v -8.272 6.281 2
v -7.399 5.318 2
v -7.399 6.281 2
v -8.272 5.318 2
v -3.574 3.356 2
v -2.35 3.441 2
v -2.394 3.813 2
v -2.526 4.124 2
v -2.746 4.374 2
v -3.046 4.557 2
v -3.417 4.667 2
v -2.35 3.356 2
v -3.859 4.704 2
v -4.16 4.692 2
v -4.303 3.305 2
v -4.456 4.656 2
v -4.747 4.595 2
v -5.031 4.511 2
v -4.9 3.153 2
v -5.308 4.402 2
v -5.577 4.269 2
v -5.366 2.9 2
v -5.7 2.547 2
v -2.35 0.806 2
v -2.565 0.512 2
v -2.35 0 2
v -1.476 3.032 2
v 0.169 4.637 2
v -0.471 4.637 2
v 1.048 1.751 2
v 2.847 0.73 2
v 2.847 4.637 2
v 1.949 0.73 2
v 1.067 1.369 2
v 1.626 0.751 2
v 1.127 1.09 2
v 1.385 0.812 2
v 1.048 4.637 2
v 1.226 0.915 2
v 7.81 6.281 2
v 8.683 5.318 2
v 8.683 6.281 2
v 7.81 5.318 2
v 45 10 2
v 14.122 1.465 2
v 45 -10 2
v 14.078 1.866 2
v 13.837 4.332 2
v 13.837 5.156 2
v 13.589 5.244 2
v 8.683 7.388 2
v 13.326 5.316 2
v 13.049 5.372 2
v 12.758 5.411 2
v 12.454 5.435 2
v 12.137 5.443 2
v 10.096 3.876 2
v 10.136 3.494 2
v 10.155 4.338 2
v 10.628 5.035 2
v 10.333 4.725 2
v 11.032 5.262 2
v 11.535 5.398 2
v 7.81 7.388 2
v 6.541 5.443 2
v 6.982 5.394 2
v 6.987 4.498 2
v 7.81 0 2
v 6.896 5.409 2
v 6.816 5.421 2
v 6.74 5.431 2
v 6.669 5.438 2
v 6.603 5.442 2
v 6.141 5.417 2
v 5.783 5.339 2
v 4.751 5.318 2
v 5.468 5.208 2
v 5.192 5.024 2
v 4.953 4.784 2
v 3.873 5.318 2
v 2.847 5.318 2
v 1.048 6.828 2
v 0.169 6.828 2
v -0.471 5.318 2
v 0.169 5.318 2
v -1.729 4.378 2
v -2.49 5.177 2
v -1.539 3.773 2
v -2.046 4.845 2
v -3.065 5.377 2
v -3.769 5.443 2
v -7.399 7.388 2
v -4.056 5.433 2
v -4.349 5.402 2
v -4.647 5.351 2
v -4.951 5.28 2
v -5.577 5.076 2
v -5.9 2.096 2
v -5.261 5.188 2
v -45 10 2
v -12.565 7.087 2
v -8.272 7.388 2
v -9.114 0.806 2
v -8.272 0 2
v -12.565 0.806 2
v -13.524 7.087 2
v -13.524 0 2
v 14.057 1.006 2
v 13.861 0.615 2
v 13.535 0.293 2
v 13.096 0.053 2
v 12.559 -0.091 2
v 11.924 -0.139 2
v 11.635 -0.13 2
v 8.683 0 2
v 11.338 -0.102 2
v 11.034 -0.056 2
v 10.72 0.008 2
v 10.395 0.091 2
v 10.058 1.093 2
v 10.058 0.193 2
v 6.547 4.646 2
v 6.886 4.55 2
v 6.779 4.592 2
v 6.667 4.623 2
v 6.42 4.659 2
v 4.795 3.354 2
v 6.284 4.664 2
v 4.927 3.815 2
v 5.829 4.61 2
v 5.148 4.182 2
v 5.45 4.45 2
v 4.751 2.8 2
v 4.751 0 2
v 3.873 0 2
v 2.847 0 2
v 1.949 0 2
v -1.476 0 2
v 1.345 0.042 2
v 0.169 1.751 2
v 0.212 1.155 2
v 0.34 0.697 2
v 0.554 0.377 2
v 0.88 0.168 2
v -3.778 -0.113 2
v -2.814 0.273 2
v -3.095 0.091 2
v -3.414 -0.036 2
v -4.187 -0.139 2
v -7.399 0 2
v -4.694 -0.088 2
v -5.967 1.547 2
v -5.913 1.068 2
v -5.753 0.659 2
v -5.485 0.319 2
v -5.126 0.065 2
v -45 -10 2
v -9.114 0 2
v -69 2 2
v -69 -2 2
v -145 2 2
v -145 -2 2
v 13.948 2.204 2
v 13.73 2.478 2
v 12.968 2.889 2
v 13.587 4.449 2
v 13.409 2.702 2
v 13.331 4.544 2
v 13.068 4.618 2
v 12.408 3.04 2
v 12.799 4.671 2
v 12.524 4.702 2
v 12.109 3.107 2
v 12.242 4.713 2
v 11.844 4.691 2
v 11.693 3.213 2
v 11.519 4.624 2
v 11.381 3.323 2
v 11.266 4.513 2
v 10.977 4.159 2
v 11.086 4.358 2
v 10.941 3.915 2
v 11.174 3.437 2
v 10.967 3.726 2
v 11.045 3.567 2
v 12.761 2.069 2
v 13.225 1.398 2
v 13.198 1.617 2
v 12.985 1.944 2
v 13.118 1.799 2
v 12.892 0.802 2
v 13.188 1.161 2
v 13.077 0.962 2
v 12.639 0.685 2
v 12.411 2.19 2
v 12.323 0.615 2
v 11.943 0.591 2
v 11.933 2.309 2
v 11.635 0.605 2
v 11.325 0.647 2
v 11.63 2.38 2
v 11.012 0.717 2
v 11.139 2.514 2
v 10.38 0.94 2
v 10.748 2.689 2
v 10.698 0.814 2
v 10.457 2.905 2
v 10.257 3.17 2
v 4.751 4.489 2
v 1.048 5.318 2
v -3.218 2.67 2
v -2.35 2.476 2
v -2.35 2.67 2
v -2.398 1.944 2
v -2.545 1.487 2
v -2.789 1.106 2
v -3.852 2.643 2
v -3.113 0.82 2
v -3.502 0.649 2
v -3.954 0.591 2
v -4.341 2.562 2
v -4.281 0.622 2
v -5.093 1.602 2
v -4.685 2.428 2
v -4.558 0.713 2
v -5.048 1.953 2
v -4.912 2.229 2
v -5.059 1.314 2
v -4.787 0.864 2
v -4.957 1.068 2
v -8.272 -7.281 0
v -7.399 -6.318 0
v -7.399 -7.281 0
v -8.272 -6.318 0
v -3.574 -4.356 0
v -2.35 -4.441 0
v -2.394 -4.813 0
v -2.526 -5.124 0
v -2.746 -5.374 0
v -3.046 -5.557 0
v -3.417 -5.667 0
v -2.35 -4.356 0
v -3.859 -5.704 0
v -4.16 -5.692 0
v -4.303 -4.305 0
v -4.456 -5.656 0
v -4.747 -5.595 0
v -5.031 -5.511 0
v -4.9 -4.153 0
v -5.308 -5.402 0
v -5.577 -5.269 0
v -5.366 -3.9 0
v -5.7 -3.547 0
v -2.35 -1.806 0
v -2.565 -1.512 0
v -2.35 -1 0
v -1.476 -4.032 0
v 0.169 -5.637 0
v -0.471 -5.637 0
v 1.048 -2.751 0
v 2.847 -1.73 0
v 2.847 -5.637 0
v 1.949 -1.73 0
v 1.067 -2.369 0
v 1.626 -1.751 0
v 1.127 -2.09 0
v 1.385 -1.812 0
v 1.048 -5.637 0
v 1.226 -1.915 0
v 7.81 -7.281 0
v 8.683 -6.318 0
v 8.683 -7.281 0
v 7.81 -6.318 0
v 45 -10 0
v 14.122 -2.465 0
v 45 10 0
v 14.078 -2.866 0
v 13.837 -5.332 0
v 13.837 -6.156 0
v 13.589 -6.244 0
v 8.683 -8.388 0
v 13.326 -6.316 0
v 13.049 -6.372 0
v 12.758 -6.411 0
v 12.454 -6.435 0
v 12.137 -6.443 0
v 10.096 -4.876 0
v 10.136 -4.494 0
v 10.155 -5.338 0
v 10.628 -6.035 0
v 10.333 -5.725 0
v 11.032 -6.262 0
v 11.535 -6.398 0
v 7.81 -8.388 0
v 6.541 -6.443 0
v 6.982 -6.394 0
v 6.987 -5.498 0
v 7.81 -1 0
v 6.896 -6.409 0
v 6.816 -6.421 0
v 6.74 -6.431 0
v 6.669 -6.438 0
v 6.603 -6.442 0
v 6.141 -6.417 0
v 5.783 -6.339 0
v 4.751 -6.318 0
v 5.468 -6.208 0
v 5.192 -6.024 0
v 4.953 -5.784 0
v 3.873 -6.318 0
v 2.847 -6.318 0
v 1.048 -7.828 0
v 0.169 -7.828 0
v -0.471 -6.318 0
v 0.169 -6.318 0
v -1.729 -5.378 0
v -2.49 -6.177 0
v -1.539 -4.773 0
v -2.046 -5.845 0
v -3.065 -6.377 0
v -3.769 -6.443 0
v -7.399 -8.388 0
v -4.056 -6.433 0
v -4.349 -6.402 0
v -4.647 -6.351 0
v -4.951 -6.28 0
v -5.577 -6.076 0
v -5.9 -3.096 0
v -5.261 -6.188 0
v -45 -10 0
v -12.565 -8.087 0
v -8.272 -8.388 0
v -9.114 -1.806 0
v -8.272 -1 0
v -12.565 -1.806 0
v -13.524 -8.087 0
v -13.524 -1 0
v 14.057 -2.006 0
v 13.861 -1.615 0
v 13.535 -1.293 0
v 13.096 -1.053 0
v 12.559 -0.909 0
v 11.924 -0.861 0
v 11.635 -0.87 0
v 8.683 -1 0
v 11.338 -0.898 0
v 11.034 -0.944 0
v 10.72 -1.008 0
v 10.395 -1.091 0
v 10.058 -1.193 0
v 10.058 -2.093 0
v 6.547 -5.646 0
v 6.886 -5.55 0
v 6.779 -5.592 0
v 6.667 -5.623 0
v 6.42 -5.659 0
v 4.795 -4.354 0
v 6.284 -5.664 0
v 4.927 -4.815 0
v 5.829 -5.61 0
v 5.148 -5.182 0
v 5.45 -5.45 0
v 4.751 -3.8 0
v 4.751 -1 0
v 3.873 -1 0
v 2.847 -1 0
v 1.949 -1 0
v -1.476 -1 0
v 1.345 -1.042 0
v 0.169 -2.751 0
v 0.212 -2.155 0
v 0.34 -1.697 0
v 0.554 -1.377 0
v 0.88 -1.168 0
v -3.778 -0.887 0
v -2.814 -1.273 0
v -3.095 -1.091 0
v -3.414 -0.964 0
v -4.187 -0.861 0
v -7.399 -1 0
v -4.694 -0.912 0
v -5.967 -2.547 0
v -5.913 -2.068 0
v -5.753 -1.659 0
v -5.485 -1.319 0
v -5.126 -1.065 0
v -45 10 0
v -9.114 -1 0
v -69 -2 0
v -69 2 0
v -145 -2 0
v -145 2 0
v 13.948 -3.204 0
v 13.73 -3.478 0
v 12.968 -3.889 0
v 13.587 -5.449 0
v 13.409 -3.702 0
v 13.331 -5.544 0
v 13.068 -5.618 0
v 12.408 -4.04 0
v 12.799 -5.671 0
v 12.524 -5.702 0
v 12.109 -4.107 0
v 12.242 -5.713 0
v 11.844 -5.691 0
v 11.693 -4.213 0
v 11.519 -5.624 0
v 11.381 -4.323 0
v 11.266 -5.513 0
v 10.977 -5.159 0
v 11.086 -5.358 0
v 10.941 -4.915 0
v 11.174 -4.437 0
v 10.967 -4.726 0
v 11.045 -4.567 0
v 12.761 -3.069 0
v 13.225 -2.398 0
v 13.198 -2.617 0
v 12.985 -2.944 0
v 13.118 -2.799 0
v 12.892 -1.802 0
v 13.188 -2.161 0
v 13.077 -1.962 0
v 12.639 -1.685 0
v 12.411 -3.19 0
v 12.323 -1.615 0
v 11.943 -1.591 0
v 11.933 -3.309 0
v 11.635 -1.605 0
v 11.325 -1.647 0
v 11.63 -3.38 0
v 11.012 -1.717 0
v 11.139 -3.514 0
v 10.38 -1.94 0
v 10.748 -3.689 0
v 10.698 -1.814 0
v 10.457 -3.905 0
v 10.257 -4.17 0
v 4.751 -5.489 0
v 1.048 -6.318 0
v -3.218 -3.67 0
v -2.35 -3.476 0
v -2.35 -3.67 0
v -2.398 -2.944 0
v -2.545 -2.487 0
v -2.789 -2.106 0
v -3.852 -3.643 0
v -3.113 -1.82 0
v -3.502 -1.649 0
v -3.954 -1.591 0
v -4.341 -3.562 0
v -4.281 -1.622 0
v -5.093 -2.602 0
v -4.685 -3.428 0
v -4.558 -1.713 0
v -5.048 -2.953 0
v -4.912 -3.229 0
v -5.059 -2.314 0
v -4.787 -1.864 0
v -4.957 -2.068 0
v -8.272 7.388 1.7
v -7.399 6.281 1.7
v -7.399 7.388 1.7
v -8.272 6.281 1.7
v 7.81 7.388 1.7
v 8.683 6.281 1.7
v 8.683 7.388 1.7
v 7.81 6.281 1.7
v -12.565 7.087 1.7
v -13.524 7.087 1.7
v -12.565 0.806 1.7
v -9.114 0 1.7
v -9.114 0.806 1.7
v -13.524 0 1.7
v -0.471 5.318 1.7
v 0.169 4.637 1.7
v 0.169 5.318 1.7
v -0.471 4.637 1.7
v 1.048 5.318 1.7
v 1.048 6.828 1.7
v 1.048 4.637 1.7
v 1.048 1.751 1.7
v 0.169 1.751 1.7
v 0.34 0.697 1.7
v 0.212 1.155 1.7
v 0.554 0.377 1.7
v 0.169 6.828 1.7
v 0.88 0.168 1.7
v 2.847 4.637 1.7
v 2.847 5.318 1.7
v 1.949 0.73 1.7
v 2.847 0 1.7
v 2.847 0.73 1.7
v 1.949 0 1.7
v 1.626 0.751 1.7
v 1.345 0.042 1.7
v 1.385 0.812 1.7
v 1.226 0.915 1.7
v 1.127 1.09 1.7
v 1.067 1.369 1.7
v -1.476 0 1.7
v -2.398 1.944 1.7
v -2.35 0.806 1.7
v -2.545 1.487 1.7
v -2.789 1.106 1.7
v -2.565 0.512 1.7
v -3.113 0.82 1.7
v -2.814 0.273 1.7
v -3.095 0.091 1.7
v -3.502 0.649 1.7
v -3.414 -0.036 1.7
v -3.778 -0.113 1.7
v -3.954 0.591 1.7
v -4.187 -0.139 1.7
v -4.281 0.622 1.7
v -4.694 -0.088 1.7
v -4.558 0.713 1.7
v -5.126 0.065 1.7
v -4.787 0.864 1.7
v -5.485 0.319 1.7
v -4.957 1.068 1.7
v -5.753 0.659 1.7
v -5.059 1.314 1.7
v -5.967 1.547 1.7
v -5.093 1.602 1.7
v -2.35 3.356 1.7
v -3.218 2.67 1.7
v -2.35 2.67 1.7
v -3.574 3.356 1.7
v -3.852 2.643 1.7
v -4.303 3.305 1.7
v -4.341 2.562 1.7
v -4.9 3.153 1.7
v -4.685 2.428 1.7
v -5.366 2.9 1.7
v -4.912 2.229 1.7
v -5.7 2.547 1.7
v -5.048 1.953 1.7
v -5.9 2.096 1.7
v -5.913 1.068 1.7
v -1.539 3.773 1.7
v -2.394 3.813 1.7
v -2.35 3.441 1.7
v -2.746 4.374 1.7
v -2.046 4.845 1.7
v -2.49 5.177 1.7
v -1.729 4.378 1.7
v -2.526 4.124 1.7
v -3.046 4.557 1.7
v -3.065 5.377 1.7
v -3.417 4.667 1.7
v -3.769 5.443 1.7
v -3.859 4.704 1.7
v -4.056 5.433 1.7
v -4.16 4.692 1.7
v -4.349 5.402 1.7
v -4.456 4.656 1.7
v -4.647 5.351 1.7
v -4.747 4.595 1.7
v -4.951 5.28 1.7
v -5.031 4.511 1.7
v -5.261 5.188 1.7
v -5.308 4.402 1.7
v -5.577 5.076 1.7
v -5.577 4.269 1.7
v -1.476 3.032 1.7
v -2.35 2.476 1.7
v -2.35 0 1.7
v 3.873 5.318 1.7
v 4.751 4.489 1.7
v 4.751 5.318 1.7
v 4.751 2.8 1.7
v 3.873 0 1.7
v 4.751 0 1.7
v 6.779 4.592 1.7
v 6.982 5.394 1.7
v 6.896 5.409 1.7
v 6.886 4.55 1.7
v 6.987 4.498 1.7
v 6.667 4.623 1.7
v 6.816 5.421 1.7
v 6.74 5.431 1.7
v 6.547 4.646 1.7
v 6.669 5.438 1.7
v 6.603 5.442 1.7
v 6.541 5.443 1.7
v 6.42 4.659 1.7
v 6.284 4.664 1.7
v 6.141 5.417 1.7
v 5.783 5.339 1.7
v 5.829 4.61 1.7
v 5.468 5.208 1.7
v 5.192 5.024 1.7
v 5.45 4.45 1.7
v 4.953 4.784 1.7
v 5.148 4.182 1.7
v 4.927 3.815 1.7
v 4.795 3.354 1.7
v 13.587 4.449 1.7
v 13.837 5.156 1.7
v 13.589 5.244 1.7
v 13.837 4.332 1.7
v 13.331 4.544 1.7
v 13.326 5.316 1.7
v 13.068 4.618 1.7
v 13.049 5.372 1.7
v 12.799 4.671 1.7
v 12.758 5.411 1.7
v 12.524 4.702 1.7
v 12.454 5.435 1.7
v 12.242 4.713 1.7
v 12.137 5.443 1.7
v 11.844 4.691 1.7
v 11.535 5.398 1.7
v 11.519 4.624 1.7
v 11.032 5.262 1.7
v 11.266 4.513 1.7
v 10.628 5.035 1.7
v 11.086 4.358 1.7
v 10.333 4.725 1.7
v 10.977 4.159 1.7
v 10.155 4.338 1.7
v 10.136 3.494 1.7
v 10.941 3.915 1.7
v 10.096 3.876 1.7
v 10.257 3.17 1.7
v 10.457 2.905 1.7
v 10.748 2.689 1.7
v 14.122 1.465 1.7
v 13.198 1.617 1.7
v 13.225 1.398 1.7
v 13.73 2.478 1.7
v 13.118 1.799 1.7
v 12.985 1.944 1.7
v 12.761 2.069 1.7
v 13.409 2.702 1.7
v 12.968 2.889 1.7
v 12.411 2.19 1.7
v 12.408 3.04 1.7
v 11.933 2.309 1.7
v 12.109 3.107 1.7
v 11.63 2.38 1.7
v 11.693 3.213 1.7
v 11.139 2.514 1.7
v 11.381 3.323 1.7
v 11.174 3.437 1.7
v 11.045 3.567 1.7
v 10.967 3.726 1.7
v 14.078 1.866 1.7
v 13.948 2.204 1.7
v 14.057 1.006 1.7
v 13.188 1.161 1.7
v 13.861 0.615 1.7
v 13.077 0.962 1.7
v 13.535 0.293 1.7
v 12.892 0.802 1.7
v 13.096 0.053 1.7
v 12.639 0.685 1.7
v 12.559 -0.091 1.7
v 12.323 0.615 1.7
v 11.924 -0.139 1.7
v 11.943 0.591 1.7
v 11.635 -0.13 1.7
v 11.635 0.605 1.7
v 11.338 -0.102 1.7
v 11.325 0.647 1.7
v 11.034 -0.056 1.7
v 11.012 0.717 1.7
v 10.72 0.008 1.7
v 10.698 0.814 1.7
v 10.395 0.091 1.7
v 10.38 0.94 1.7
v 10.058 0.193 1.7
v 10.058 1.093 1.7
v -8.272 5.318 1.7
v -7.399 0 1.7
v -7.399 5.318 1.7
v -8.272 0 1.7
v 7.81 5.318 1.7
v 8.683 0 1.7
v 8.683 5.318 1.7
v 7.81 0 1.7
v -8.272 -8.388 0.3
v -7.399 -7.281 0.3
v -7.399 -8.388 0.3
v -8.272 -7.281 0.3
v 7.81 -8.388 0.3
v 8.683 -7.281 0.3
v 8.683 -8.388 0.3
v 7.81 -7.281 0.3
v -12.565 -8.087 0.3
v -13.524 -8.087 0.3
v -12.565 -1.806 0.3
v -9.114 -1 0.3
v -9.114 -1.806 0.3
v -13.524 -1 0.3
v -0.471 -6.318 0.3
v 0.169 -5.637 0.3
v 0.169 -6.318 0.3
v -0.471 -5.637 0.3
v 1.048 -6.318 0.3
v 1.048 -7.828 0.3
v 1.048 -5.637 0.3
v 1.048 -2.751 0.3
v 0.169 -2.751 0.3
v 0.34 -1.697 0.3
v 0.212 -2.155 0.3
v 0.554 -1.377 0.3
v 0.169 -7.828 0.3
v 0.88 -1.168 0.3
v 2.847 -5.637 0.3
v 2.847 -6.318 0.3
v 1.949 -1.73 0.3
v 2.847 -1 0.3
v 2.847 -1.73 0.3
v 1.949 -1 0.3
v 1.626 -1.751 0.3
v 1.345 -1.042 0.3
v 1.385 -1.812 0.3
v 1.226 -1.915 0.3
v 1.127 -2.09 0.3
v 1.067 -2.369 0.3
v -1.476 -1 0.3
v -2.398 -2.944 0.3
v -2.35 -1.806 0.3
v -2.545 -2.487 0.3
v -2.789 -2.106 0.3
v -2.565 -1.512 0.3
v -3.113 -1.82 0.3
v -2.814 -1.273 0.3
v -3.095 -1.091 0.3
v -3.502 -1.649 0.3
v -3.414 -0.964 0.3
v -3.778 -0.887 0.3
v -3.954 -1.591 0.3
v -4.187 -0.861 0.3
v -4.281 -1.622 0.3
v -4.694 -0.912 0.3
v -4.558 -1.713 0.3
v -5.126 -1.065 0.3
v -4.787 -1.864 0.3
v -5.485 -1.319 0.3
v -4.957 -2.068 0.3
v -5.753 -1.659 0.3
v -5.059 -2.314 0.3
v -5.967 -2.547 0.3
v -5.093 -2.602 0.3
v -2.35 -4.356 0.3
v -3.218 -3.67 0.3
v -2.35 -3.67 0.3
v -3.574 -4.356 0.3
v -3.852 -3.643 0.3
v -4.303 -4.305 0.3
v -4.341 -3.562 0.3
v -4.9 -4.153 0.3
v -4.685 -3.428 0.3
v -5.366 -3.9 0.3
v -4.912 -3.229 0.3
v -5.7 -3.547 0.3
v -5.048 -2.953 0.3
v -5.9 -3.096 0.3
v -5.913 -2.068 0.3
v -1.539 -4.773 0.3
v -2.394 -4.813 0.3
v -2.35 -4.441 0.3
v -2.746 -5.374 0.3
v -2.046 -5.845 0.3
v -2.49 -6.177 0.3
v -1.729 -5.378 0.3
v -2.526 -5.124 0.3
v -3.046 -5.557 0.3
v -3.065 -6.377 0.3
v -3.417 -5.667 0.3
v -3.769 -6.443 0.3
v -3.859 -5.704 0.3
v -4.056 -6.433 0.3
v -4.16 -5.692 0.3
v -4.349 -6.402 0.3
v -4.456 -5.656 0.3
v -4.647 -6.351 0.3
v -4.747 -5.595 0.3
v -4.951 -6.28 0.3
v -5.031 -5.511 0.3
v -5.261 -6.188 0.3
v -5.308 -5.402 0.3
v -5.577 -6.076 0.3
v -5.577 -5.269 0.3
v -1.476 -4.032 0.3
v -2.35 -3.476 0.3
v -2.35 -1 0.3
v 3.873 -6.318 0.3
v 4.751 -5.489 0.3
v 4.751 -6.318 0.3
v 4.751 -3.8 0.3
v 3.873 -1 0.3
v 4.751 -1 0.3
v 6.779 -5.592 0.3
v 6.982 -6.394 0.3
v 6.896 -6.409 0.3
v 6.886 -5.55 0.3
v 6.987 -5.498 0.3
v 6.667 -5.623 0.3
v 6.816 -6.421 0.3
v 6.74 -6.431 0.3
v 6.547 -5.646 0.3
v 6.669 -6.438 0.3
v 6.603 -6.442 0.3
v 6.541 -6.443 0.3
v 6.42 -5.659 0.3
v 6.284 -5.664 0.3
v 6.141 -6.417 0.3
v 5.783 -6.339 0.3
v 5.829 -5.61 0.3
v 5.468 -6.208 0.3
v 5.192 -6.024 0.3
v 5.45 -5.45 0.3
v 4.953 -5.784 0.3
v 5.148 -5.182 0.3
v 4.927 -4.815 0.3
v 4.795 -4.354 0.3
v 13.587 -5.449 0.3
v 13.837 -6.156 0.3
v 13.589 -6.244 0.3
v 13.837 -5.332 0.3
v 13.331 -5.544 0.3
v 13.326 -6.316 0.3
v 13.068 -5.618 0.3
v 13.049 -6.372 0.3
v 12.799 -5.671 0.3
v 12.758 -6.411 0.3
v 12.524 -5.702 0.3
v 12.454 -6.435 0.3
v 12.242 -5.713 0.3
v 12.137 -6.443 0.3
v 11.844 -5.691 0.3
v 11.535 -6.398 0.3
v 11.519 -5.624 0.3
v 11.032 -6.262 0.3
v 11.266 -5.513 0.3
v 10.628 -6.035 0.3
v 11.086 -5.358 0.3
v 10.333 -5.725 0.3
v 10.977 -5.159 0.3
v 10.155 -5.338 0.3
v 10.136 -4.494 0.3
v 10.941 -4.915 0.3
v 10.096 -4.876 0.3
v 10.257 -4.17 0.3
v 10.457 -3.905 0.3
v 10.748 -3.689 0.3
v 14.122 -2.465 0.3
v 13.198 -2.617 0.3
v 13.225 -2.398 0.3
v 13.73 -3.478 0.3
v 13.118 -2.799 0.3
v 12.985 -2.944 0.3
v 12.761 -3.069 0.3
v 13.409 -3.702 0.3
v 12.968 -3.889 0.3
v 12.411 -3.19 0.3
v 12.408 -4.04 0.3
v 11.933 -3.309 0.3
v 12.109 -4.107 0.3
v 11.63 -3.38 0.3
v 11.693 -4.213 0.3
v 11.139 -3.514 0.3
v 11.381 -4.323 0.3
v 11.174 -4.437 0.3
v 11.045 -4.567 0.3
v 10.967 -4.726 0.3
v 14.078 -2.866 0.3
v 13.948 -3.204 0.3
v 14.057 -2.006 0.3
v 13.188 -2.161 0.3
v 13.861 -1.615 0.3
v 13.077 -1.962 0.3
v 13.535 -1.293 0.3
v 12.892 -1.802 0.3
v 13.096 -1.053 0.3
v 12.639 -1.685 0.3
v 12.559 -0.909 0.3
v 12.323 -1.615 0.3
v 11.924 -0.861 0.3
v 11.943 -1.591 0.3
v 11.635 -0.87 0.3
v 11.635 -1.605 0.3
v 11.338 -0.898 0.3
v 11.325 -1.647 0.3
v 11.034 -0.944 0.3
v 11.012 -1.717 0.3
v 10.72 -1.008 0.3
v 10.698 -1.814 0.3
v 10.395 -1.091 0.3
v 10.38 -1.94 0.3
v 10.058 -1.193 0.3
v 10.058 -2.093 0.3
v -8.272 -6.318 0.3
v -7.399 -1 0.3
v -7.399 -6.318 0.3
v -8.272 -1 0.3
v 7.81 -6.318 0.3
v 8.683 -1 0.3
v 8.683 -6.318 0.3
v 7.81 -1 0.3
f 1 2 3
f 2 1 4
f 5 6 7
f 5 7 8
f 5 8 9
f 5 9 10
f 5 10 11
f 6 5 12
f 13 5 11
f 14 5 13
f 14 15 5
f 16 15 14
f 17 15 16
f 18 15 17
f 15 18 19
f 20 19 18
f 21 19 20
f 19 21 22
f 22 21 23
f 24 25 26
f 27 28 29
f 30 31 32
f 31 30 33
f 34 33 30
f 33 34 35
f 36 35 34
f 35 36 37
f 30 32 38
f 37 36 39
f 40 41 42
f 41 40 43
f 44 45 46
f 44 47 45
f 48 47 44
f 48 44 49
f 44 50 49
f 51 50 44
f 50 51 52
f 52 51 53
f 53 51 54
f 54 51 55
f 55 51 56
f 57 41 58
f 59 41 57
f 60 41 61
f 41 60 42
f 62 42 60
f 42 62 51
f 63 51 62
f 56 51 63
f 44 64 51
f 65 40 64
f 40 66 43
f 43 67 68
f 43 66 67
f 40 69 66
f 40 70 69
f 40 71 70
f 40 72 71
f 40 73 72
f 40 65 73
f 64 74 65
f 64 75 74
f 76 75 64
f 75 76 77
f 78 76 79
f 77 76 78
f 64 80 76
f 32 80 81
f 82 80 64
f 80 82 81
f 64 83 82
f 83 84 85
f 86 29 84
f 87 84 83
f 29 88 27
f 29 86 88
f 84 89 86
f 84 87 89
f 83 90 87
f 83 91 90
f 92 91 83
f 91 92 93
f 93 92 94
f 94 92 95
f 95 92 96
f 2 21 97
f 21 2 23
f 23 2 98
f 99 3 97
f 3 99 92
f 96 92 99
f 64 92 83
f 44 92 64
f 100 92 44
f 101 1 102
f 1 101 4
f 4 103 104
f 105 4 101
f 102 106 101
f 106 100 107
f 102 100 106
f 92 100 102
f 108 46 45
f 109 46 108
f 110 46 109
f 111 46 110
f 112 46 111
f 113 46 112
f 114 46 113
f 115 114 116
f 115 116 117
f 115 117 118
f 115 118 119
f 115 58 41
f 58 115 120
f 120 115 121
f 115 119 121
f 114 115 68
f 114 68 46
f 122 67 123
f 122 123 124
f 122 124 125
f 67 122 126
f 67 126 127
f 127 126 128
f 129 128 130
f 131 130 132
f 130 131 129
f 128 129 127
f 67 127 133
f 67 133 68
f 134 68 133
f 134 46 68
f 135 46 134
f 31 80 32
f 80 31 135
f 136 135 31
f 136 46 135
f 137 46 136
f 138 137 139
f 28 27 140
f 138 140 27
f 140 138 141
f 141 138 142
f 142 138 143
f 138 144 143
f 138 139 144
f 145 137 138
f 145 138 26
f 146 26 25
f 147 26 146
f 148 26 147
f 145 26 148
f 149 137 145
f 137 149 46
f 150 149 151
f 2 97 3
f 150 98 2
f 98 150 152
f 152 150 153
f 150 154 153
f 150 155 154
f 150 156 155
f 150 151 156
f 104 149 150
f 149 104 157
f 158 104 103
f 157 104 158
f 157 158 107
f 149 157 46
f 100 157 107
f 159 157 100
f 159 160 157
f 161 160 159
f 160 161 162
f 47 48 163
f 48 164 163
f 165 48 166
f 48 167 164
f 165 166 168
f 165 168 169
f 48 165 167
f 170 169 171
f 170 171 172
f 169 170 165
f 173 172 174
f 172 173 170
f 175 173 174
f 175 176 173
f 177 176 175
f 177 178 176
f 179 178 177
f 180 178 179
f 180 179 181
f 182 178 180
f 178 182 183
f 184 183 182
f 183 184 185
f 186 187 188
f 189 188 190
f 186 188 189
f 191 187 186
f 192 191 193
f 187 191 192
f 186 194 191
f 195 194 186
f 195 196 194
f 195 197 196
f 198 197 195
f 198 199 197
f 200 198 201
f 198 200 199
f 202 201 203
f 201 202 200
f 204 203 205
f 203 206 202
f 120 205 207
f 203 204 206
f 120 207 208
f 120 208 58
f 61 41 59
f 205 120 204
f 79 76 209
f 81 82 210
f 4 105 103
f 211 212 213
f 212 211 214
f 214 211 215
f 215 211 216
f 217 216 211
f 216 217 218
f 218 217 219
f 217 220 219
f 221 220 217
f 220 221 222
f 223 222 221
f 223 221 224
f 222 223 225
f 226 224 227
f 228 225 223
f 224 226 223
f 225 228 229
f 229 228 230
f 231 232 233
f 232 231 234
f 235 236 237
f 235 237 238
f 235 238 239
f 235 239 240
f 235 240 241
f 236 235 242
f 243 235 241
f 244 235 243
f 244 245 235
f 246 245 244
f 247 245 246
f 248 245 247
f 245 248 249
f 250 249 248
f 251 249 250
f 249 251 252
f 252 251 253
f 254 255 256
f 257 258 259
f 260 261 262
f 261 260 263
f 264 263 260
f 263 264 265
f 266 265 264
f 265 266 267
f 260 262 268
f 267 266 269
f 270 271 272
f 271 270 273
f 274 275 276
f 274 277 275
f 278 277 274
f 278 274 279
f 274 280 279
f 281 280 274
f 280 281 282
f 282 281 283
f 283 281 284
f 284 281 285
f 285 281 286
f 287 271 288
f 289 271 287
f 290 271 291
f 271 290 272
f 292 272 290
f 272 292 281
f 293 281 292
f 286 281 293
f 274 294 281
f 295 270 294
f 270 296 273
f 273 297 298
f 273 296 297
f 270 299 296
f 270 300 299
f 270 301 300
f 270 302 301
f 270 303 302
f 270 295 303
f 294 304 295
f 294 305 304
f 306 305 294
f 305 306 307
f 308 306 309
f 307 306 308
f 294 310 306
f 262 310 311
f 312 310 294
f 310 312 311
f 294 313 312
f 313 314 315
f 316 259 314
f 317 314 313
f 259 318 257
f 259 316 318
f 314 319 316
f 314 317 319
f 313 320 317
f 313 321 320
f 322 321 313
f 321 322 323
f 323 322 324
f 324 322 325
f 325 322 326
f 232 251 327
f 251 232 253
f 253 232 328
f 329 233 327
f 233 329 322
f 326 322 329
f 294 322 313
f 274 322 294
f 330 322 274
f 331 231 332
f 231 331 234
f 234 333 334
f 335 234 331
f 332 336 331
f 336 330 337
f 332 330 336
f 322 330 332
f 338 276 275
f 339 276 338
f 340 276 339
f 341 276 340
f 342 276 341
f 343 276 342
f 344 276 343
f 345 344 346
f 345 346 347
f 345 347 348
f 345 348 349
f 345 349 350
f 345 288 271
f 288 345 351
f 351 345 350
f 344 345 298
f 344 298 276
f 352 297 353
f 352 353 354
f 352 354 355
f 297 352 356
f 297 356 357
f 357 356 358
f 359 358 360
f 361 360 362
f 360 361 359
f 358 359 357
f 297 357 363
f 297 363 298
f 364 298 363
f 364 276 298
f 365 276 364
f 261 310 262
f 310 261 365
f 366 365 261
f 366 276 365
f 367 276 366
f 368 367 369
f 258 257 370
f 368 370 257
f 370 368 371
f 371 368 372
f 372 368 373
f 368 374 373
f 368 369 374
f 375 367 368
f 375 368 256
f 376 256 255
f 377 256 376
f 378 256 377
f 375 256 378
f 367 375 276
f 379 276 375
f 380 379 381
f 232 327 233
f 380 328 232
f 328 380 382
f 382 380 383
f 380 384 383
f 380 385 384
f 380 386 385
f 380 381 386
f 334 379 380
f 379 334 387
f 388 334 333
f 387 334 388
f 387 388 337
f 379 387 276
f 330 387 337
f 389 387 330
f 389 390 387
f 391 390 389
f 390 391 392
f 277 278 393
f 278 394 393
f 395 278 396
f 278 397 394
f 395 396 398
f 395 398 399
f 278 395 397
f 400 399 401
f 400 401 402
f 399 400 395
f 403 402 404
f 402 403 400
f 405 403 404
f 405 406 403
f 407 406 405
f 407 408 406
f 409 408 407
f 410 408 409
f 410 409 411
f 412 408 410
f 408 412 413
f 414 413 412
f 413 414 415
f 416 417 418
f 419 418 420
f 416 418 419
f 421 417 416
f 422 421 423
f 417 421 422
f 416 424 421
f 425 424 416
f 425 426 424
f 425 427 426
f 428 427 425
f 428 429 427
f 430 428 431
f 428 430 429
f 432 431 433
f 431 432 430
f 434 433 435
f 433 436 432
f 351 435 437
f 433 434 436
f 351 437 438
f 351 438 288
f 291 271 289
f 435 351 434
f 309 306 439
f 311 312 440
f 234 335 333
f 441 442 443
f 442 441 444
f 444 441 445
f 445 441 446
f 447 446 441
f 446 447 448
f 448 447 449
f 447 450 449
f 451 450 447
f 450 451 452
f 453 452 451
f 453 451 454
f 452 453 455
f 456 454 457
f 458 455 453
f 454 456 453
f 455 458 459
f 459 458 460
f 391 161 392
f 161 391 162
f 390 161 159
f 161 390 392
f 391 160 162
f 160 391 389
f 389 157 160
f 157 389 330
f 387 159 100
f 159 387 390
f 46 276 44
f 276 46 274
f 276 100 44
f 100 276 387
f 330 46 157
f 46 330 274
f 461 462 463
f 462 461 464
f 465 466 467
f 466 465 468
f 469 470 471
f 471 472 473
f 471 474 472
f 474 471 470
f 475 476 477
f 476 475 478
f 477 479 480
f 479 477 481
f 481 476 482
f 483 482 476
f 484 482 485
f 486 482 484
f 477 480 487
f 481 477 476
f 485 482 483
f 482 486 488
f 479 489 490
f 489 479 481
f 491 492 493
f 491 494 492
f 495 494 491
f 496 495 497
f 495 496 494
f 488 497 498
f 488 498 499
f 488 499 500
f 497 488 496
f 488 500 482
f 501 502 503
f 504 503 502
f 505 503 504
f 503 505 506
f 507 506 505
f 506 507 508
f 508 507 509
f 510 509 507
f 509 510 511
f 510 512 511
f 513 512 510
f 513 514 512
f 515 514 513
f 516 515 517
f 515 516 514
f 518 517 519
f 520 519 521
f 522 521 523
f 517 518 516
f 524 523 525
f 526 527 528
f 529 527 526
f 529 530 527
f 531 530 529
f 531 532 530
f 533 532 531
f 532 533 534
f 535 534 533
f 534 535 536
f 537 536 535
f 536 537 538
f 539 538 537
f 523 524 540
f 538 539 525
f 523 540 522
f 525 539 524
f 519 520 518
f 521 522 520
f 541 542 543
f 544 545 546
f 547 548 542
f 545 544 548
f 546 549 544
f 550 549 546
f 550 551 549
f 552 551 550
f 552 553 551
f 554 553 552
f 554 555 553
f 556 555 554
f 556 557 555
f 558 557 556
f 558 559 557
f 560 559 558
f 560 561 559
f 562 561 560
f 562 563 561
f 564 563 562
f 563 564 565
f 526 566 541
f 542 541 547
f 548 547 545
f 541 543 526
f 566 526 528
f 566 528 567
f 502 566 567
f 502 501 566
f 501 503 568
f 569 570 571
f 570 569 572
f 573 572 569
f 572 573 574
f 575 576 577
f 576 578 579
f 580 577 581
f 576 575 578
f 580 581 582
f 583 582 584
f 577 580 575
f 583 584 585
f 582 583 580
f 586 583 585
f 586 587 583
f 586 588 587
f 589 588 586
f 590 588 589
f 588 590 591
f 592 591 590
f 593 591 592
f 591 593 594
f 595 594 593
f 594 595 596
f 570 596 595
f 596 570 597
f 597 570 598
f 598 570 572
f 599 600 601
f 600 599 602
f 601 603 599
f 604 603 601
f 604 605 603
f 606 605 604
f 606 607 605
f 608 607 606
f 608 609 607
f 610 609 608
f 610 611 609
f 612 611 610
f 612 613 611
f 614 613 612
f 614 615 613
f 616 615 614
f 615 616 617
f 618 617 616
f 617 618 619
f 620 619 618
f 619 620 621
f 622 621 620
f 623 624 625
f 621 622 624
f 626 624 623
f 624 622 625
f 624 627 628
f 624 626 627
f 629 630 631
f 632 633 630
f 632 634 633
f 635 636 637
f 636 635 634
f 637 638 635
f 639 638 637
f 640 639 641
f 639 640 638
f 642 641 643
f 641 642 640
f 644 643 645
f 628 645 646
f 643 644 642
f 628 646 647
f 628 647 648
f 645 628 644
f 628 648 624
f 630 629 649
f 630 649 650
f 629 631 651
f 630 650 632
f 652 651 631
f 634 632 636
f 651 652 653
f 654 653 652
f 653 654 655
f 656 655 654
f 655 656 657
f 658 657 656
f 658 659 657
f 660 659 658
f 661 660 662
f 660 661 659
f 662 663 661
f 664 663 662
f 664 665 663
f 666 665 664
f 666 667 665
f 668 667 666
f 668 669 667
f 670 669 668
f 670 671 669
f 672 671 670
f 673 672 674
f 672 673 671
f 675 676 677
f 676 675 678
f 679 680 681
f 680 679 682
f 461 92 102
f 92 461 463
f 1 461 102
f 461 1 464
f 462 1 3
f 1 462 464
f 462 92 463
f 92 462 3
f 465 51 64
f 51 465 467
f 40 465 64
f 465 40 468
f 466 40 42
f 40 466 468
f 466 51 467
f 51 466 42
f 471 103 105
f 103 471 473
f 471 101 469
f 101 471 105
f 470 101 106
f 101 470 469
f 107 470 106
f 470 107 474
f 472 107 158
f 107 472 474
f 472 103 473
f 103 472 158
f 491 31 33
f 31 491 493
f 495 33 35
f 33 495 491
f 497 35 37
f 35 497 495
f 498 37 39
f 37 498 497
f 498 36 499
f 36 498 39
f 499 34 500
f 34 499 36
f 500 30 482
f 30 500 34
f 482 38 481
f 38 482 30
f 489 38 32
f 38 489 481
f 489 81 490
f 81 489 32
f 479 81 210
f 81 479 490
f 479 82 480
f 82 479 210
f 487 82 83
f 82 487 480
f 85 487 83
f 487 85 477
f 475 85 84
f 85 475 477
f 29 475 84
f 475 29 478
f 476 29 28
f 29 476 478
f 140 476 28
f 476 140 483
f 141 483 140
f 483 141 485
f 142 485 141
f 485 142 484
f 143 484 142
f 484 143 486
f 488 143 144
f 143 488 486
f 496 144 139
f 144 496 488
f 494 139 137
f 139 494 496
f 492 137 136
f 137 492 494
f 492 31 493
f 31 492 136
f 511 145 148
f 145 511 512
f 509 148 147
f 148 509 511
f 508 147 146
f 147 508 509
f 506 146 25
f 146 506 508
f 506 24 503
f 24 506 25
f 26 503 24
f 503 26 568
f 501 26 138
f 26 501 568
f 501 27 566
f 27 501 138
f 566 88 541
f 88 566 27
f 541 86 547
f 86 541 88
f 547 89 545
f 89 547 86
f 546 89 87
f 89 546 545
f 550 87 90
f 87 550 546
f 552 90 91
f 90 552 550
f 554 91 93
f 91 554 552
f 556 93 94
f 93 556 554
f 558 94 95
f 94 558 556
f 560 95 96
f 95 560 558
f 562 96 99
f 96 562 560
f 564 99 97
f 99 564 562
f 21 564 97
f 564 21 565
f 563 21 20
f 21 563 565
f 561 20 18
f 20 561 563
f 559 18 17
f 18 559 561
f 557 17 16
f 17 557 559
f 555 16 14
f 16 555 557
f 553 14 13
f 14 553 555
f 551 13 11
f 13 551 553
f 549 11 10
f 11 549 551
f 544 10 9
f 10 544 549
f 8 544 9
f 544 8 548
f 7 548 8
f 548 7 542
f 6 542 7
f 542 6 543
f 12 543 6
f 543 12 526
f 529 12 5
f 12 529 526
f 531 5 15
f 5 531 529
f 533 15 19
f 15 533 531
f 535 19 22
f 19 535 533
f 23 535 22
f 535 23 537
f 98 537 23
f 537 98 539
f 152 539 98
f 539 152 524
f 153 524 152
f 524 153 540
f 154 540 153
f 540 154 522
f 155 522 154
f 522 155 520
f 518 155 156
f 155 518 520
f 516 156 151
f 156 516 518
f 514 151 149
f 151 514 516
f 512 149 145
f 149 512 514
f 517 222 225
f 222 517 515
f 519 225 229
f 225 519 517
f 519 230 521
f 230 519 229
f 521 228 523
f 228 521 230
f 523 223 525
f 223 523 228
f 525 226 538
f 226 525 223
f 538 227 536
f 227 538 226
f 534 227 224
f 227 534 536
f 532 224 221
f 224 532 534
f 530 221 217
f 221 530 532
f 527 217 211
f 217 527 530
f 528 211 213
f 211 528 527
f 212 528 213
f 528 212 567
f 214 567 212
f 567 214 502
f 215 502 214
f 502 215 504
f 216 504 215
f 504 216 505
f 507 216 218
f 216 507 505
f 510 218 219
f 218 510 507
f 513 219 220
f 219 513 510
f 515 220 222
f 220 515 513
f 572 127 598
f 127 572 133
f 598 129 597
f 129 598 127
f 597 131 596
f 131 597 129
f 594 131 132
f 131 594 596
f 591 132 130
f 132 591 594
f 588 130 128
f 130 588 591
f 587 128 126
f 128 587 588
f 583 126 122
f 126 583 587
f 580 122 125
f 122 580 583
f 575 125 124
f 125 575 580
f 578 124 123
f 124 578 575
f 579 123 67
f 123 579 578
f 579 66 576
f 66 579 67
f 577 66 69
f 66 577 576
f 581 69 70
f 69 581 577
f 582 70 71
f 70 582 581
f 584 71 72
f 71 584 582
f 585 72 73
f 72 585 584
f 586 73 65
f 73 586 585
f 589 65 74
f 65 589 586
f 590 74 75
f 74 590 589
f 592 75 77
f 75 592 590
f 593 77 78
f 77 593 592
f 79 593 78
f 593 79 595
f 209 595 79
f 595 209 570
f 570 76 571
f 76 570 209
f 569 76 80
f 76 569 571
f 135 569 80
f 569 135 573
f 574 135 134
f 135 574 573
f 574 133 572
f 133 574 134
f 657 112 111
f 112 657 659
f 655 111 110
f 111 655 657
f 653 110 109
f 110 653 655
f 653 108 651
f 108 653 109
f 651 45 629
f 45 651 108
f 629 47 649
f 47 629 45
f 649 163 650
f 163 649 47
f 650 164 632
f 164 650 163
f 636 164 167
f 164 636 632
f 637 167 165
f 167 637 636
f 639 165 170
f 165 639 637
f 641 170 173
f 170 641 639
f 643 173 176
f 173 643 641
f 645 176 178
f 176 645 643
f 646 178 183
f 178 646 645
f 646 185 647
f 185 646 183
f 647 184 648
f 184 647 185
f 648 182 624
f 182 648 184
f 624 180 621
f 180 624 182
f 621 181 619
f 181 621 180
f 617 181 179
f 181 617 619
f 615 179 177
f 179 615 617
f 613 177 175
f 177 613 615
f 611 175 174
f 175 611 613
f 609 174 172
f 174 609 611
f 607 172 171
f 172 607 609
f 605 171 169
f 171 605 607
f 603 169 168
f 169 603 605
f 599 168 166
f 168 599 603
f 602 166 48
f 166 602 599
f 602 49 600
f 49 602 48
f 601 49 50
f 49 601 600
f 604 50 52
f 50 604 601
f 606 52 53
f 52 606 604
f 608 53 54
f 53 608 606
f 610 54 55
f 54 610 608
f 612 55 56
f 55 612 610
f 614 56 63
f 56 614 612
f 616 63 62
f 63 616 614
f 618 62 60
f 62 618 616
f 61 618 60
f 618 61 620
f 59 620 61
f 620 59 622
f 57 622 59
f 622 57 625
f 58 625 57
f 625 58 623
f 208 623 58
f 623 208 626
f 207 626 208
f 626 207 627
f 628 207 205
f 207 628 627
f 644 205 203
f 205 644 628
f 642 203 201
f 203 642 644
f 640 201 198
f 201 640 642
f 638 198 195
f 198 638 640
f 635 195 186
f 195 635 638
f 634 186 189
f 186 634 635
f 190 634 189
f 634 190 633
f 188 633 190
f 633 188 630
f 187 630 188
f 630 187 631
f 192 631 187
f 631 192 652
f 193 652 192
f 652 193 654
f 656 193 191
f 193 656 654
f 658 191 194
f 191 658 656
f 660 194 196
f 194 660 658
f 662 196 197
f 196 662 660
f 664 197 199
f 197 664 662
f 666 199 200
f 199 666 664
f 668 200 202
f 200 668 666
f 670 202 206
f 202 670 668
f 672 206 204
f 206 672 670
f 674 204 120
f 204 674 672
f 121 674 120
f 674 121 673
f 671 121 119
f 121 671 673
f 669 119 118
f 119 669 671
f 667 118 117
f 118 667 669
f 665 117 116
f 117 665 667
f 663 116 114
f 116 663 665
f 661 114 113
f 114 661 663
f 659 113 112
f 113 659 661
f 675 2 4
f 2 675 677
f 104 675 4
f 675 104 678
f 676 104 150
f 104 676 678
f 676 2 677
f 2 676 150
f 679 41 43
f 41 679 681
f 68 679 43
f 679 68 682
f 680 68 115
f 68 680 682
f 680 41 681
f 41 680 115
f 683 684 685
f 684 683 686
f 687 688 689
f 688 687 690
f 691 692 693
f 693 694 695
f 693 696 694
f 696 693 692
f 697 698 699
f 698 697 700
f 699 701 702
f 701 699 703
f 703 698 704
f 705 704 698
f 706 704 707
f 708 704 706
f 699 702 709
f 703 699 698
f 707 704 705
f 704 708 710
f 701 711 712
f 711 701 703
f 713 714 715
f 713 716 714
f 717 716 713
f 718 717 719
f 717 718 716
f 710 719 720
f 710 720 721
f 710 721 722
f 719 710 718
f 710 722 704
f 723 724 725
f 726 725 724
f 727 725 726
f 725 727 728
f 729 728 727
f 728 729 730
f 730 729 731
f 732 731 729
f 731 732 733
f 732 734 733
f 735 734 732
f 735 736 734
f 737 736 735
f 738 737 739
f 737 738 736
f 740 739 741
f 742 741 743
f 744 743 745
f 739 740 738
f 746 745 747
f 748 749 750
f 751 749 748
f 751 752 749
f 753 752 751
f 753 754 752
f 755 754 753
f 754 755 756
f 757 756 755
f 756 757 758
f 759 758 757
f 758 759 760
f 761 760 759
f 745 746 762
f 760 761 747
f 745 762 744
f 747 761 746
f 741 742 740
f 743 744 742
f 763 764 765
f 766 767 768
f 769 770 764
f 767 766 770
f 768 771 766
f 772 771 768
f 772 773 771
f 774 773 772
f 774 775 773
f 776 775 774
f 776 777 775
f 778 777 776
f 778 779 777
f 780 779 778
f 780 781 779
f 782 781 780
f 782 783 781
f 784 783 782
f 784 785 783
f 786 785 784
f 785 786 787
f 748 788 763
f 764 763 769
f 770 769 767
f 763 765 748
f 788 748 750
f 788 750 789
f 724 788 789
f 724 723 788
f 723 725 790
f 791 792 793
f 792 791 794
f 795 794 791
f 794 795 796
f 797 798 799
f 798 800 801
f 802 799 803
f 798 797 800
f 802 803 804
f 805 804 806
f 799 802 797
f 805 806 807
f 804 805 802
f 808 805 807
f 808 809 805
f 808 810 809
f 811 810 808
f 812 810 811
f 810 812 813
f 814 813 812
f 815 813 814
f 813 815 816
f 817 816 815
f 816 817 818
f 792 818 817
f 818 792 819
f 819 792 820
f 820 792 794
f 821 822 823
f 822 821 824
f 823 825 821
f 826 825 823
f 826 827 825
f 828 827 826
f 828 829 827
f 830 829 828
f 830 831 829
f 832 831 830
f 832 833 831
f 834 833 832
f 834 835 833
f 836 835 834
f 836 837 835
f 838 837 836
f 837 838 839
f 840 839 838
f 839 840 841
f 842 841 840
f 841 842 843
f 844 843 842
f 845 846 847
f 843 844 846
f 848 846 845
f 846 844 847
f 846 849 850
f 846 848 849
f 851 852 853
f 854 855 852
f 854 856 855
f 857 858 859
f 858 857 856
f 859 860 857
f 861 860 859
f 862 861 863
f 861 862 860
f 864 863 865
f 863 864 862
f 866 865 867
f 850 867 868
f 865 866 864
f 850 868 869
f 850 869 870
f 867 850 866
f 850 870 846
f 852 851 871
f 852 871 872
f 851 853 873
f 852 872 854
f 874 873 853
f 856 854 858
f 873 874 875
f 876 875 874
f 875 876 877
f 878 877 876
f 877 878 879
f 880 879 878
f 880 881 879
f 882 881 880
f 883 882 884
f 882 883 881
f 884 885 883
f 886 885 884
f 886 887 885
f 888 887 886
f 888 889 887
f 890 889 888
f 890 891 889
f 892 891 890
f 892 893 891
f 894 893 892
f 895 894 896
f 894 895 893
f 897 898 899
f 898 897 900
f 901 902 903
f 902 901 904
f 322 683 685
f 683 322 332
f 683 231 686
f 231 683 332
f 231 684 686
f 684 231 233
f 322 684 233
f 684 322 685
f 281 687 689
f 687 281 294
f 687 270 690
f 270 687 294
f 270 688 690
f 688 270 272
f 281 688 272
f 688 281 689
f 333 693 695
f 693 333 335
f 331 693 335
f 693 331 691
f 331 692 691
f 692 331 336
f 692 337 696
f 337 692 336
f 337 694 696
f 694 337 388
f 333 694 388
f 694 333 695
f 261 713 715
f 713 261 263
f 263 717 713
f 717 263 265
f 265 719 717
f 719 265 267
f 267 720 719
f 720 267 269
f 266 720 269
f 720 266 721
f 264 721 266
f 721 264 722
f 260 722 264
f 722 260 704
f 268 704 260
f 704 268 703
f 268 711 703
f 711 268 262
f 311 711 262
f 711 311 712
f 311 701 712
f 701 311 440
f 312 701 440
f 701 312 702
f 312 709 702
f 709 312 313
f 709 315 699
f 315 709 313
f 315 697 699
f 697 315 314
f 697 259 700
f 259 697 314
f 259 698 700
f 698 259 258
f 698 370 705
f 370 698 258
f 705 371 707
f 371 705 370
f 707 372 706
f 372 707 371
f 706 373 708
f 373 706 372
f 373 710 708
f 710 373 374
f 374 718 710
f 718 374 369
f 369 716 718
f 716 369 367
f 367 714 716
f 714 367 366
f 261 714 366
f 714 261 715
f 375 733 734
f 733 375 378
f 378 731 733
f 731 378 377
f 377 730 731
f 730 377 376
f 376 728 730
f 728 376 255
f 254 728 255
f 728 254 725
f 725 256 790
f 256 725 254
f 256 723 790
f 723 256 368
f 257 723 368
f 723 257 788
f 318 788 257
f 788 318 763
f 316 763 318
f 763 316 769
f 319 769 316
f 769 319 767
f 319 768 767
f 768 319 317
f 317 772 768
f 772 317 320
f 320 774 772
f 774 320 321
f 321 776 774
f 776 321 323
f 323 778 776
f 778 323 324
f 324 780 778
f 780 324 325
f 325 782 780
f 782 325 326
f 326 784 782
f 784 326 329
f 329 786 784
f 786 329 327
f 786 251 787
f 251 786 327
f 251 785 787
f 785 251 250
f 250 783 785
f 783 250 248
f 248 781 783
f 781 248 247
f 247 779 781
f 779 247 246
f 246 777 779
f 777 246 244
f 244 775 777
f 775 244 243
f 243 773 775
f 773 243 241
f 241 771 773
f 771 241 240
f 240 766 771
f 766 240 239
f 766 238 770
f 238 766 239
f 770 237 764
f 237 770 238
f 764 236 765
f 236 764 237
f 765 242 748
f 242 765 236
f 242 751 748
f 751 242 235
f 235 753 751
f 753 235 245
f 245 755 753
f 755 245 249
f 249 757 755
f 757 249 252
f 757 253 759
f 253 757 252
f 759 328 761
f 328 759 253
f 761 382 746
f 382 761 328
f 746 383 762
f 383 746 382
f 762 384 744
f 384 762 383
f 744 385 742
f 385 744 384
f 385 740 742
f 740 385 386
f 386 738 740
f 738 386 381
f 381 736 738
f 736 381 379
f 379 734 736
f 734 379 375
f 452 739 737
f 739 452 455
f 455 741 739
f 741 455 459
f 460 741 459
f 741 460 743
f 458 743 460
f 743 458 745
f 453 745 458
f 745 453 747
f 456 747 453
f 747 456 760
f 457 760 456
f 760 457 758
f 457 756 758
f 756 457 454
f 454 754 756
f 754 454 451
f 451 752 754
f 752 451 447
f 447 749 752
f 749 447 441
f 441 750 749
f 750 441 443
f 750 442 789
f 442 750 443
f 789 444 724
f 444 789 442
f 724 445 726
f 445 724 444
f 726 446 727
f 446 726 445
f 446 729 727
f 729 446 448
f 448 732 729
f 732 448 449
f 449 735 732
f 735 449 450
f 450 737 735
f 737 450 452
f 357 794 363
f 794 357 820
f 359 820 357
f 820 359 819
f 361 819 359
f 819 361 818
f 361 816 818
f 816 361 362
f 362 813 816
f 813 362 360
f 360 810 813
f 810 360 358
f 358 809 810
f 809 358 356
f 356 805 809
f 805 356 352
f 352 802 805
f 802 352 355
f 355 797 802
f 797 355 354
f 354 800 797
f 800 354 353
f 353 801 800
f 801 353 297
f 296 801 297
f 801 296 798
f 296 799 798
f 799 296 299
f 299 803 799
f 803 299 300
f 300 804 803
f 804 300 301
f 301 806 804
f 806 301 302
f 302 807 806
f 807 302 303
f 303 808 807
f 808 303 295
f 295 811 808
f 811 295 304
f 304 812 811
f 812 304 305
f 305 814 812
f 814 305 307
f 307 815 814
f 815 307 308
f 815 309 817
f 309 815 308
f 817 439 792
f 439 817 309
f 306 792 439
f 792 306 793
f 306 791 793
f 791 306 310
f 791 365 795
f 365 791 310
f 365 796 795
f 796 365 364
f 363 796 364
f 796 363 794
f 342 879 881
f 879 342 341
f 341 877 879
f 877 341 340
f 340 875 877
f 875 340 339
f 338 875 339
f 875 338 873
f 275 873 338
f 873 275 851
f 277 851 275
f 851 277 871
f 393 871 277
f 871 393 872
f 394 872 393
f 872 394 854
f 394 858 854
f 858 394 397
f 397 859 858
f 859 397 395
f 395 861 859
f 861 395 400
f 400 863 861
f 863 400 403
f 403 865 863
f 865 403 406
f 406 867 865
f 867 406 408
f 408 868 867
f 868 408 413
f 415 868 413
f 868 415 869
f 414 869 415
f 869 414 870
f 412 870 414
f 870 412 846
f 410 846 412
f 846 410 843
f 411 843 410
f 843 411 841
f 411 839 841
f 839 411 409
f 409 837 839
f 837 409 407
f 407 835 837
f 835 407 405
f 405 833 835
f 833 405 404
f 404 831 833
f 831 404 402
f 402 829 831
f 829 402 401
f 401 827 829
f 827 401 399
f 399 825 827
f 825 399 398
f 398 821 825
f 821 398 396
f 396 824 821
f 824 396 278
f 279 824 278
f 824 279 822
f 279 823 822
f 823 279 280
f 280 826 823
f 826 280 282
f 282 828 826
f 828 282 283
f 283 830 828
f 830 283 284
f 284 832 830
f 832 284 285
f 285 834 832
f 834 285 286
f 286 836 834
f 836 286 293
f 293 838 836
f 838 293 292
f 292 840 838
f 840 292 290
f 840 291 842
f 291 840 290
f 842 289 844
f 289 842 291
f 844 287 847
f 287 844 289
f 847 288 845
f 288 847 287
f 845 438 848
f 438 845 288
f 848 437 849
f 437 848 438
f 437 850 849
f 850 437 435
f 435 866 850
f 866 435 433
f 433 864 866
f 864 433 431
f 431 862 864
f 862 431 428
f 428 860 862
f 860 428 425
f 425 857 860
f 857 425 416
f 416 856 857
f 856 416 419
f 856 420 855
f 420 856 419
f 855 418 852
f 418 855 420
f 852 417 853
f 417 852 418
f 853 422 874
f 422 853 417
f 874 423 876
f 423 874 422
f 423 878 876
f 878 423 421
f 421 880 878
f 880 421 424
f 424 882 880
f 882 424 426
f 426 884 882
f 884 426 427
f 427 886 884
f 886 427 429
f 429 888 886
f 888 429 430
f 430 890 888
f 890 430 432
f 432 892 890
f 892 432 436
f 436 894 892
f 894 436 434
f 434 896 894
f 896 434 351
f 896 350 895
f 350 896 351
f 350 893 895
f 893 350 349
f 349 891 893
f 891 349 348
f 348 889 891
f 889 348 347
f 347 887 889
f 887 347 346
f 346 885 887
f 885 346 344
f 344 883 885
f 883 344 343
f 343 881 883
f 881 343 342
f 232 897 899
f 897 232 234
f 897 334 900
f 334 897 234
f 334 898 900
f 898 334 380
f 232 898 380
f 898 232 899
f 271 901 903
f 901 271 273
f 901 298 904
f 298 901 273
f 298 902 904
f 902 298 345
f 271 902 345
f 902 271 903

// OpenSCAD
letter="Liatris";
smallText="";
    
length = 90;    
textStart = 0; 
height = 2; 

module GetText(bigText, littleText) { 
    union() {         
        translate([textStart, 0, 1.7])
            color("black", 1)
                linear_extrude(height=.301, convexity=4)
                    text(bigText, 
                    font="Bitstream Vera Sans",
                    halign="center",
                    size=7
                    );
        
        translate([textStart, -8, 1.7])
            color("black", 1)
                linear_extrude(height=.301, convexity=4)
                    text(littleText, 
                    font="Bitstream Vera Sans",
                    halign="center",
                    size=5// 3 is too small, doesn't extrude
                          // 4 is readable, but leaves gaps
                    );
            }
}

// First extrusion 
/*marker_one*/difference () { 
    color("white", 1.0)
        union() { 
            //stem
            translate([-length/2 - 100, -2, 0])
                cube([100, 4, height]);
            
            // tapered neck 
            linear_extrude(height) { 
                polygon(points=[[-length/2 -30, 0], [-length / 2, +10], [-length /2, -10], [-length / 2 - 30, 0]]);
            } 
            
            //Broad flat area for text
            translate([-length/2, -10, 0])
                cube([length, 20, height], center=false) ;
        }
    
    // holes for text 
    color("black", 1) 
        union() { 
            GetText(letter, smallText); 

            rotate([180, 0, 0])
                translate([textStart, 1, -2])
                    GetText(letter, smallText); 
        }
}

// Second Extrusion
*union() { 
    GetText(letter, smallText); 

    rotate([180, 0, 0])
        translate([textStart, 1, -2])
            GetText(letter, smallText); 
}

    
